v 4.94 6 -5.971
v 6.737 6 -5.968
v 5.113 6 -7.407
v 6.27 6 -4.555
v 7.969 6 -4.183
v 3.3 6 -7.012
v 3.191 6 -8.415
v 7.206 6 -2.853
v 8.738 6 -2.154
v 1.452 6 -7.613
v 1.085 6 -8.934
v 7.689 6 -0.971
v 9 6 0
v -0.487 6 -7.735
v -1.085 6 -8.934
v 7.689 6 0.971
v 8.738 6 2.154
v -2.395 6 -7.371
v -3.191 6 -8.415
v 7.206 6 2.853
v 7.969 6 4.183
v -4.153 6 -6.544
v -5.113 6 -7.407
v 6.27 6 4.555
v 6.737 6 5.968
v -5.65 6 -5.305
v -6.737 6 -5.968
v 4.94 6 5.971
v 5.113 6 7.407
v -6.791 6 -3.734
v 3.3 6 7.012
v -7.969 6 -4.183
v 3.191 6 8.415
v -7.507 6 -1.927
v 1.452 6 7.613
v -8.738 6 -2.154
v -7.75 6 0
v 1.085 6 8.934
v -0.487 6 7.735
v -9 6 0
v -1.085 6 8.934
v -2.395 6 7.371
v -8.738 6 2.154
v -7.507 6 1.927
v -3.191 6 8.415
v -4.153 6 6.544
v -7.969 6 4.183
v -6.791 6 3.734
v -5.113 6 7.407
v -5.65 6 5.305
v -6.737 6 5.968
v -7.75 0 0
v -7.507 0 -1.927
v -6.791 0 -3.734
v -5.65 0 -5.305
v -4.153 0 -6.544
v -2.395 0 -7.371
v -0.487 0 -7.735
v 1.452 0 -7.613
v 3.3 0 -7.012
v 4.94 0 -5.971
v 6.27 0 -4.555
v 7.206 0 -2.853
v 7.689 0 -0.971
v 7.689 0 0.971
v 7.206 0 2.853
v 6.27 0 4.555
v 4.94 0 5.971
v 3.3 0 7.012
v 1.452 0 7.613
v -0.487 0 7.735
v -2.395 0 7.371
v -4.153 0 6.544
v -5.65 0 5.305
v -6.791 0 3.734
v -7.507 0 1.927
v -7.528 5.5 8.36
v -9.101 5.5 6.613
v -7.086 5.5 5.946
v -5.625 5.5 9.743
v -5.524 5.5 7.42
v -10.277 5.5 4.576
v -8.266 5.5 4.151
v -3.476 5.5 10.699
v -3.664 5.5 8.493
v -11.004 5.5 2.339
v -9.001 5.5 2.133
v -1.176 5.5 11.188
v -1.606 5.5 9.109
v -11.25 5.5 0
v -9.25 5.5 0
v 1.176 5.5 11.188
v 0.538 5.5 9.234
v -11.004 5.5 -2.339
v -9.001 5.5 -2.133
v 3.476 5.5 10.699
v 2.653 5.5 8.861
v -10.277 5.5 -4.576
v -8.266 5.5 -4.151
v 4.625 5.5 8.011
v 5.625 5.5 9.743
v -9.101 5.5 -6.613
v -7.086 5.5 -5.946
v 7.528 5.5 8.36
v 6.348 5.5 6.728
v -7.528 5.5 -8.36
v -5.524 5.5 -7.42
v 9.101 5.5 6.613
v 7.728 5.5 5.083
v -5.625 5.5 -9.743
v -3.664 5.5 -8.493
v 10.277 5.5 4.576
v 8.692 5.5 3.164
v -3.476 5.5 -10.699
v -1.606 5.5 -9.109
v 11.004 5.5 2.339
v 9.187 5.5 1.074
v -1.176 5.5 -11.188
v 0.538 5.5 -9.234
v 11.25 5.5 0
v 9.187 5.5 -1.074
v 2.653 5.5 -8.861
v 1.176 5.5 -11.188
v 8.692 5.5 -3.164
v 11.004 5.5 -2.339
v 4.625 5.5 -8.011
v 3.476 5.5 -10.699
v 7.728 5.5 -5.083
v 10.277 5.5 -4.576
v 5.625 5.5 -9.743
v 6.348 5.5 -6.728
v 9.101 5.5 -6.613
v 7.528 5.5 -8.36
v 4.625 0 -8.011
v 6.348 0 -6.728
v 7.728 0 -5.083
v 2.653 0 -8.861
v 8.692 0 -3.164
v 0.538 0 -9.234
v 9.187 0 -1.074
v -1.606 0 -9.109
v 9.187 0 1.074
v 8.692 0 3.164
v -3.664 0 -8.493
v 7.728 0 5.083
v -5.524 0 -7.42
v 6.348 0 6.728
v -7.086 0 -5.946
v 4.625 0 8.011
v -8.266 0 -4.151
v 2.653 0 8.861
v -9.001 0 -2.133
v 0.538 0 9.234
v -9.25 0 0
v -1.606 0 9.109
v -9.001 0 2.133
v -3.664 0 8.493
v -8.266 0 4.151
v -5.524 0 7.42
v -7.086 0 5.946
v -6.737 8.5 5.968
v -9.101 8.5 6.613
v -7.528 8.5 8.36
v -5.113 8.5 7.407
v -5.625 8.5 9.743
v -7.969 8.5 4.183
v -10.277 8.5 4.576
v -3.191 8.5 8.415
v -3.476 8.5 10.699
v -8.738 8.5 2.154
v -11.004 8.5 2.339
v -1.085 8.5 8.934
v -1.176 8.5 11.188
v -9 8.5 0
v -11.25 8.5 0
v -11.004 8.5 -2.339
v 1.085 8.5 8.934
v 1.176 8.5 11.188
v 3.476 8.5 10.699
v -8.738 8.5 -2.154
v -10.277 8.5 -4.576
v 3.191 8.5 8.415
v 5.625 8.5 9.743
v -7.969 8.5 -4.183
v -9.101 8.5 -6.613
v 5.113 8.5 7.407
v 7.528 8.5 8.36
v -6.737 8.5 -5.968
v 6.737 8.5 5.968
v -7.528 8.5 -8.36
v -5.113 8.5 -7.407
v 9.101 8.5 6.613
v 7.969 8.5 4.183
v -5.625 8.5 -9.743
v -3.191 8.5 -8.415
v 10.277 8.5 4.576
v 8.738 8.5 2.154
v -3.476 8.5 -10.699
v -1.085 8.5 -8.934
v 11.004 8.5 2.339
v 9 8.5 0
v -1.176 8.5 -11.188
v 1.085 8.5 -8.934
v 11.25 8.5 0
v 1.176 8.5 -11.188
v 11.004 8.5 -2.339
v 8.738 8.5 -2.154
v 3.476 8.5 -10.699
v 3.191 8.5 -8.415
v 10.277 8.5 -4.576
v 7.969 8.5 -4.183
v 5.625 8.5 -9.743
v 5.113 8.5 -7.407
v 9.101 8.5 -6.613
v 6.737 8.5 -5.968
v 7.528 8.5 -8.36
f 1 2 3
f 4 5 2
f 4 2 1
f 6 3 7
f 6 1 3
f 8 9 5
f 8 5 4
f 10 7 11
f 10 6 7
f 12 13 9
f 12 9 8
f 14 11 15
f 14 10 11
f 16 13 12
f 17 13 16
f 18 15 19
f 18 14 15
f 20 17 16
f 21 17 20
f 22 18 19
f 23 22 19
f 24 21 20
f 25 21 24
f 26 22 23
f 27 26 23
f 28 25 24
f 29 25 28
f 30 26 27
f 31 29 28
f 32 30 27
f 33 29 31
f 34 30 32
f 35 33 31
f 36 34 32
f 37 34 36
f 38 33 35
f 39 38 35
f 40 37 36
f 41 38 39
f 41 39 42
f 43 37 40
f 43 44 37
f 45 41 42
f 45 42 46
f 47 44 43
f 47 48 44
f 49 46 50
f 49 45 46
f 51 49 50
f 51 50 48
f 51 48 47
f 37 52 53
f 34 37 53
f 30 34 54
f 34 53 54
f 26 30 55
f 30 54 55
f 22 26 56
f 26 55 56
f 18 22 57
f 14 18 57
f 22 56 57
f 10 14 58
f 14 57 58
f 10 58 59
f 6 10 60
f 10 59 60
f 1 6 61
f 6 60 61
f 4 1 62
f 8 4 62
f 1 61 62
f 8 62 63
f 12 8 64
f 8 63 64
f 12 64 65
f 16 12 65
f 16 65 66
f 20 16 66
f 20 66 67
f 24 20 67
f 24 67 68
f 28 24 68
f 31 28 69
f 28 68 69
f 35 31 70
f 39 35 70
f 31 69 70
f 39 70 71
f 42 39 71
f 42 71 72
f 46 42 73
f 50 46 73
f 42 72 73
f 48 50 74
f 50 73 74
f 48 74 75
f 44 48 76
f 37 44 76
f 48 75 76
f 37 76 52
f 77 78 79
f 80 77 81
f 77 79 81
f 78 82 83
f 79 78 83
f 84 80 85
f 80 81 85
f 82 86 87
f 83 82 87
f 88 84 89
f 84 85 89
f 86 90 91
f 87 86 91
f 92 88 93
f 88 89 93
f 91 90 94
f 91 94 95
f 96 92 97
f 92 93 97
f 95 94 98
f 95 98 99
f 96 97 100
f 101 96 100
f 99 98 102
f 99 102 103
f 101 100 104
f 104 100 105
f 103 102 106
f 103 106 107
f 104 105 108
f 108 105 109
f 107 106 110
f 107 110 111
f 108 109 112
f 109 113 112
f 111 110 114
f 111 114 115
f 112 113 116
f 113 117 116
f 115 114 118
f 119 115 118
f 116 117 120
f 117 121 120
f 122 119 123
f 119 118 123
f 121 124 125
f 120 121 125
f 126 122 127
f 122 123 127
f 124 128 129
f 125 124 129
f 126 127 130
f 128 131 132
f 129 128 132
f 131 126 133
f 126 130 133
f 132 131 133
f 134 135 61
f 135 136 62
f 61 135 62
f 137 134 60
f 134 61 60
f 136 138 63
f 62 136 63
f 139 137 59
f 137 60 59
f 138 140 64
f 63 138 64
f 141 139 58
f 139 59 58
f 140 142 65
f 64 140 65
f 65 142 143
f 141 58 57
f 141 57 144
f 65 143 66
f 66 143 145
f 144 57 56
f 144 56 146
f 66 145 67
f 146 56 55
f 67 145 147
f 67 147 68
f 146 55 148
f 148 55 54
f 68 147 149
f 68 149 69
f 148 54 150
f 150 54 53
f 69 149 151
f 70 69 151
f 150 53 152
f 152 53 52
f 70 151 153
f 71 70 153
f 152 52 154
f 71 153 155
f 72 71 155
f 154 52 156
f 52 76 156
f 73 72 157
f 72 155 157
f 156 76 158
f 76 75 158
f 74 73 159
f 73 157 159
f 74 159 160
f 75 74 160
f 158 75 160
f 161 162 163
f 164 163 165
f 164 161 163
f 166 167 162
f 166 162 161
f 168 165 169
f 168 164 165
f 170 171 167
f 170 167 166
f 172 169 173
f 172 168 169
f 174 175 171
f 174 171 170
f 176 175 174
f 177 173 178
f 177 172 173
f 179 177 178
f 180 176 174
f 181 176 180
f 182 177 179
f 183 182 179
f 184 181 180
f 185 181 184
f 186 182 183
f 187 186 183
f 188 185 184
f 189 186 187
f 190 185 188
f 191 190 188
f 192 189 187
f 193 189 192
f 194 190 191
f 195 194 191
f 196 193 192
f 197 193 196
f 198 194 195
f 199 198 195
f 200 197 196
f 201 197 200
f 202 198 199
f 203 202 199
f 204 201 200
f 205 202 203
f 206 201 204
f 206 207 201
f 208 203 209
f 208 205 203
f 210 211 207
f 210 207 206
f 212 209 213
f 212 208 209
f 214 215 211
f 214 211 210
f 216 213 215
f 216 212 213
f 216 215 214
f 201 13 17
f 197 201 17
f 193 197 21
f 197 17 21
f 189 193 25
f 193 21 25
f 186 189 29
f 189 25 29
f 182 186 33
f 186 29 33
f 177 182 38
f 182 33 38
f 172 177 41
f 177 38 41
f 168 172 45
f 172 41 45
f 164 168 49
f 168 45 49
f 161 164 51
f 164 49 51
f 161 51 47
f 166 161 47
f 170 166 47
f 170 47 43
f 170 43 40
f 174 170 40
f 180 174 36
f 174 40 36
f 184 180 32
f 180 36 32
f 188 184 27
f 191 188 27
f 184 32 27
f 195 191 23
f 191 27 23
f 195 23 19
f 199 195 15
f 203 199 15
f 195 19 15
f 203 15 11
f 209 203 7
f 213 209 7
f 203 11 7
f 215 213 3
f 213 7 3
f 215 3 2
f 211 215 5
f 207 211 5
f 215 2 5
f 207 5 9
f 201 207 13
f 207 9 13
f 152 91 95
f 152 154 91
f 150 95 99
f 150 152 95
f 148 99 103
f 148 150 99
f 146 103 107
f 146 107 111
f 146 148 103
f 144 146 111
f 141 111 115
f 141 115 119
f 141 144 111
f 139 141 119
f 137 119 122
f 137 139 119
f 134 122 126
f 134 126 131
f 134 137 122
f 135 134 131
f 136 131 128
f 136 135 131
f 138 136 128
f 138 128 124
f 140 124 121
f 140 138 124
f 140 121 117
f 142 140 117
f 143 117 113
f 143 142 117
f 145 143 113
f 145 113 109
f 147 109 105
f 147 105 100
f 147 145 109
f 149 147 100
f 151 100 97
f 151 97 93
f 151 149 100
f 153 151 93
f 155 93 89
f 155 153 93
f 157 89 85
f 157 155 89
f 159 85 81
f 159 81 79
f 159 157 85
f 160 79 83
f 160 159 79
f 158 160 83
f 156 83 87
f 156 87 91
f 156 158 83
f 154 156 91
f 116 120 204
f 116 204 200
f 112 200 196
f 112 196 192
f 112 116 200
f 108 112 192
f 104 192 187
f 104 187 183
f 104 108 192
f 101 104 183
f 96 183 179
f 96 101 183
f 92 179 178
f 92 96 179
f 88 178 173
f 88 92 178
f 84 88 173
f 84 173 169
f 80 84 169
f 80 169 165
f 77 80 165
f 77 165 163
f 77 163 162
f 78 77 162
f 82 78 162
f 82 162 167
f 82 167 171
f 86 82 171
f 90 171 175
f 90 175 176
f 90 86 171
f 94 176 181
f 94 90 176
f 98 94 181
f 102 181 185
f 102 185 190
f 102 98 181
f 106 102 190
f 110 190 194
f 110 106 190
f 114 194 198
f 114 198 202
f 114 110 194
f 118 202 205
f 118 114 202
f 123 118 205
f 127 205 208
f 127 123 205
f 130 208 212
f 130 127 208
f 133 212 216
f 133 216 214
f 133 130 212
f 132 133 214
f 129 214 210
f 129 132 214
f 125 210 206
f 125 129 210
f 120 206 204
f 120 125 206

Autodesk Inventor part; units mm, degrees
ref_plane "YZ Plane" through (0, 0, 0) normal (1, 0, 0) x (0, 1, 0)
ref_plane "XZ Plane" through (0, 0, 0) normal (0, 1, 0) x (-1, 0, 0)
ref_plane "XY Plane" through (0, 0, 0) normal (0, 0, 1) x (1, 0, 0)
sketch "Sketch1" plane through (0, 0, 0) normal (0, 1, 0) x (-1, 0, 0)
  circle A0 centre (0, 0) radius 7.75
  circle A1 centre (0, 0) radius 9.25
  dimension "d0" = 15.5
  dimension "d1" = 18.5
extrude "Extrusion1" add sketch "Sketch1" along normal blind 5.5
sketch "Sketch5" plane through (0, 5.5, 0) normal (0, 1, 0) x (1, 0, 0)
  circle A0 centre (0, 0) radius 11.25
  circle A1 centre (0, 0) radius 9
  dimension "d13" = 22.5
  dimension "d14" = 18
extrude "Extrusion5" add sketch "Sketch5" along normal blind 3
move faces "Move1" translate (0, 0.5, 0) faces at (8.4211, 5.5, 1.3362)
properties part number "685ZZFlanged_Adapter_2mm"
